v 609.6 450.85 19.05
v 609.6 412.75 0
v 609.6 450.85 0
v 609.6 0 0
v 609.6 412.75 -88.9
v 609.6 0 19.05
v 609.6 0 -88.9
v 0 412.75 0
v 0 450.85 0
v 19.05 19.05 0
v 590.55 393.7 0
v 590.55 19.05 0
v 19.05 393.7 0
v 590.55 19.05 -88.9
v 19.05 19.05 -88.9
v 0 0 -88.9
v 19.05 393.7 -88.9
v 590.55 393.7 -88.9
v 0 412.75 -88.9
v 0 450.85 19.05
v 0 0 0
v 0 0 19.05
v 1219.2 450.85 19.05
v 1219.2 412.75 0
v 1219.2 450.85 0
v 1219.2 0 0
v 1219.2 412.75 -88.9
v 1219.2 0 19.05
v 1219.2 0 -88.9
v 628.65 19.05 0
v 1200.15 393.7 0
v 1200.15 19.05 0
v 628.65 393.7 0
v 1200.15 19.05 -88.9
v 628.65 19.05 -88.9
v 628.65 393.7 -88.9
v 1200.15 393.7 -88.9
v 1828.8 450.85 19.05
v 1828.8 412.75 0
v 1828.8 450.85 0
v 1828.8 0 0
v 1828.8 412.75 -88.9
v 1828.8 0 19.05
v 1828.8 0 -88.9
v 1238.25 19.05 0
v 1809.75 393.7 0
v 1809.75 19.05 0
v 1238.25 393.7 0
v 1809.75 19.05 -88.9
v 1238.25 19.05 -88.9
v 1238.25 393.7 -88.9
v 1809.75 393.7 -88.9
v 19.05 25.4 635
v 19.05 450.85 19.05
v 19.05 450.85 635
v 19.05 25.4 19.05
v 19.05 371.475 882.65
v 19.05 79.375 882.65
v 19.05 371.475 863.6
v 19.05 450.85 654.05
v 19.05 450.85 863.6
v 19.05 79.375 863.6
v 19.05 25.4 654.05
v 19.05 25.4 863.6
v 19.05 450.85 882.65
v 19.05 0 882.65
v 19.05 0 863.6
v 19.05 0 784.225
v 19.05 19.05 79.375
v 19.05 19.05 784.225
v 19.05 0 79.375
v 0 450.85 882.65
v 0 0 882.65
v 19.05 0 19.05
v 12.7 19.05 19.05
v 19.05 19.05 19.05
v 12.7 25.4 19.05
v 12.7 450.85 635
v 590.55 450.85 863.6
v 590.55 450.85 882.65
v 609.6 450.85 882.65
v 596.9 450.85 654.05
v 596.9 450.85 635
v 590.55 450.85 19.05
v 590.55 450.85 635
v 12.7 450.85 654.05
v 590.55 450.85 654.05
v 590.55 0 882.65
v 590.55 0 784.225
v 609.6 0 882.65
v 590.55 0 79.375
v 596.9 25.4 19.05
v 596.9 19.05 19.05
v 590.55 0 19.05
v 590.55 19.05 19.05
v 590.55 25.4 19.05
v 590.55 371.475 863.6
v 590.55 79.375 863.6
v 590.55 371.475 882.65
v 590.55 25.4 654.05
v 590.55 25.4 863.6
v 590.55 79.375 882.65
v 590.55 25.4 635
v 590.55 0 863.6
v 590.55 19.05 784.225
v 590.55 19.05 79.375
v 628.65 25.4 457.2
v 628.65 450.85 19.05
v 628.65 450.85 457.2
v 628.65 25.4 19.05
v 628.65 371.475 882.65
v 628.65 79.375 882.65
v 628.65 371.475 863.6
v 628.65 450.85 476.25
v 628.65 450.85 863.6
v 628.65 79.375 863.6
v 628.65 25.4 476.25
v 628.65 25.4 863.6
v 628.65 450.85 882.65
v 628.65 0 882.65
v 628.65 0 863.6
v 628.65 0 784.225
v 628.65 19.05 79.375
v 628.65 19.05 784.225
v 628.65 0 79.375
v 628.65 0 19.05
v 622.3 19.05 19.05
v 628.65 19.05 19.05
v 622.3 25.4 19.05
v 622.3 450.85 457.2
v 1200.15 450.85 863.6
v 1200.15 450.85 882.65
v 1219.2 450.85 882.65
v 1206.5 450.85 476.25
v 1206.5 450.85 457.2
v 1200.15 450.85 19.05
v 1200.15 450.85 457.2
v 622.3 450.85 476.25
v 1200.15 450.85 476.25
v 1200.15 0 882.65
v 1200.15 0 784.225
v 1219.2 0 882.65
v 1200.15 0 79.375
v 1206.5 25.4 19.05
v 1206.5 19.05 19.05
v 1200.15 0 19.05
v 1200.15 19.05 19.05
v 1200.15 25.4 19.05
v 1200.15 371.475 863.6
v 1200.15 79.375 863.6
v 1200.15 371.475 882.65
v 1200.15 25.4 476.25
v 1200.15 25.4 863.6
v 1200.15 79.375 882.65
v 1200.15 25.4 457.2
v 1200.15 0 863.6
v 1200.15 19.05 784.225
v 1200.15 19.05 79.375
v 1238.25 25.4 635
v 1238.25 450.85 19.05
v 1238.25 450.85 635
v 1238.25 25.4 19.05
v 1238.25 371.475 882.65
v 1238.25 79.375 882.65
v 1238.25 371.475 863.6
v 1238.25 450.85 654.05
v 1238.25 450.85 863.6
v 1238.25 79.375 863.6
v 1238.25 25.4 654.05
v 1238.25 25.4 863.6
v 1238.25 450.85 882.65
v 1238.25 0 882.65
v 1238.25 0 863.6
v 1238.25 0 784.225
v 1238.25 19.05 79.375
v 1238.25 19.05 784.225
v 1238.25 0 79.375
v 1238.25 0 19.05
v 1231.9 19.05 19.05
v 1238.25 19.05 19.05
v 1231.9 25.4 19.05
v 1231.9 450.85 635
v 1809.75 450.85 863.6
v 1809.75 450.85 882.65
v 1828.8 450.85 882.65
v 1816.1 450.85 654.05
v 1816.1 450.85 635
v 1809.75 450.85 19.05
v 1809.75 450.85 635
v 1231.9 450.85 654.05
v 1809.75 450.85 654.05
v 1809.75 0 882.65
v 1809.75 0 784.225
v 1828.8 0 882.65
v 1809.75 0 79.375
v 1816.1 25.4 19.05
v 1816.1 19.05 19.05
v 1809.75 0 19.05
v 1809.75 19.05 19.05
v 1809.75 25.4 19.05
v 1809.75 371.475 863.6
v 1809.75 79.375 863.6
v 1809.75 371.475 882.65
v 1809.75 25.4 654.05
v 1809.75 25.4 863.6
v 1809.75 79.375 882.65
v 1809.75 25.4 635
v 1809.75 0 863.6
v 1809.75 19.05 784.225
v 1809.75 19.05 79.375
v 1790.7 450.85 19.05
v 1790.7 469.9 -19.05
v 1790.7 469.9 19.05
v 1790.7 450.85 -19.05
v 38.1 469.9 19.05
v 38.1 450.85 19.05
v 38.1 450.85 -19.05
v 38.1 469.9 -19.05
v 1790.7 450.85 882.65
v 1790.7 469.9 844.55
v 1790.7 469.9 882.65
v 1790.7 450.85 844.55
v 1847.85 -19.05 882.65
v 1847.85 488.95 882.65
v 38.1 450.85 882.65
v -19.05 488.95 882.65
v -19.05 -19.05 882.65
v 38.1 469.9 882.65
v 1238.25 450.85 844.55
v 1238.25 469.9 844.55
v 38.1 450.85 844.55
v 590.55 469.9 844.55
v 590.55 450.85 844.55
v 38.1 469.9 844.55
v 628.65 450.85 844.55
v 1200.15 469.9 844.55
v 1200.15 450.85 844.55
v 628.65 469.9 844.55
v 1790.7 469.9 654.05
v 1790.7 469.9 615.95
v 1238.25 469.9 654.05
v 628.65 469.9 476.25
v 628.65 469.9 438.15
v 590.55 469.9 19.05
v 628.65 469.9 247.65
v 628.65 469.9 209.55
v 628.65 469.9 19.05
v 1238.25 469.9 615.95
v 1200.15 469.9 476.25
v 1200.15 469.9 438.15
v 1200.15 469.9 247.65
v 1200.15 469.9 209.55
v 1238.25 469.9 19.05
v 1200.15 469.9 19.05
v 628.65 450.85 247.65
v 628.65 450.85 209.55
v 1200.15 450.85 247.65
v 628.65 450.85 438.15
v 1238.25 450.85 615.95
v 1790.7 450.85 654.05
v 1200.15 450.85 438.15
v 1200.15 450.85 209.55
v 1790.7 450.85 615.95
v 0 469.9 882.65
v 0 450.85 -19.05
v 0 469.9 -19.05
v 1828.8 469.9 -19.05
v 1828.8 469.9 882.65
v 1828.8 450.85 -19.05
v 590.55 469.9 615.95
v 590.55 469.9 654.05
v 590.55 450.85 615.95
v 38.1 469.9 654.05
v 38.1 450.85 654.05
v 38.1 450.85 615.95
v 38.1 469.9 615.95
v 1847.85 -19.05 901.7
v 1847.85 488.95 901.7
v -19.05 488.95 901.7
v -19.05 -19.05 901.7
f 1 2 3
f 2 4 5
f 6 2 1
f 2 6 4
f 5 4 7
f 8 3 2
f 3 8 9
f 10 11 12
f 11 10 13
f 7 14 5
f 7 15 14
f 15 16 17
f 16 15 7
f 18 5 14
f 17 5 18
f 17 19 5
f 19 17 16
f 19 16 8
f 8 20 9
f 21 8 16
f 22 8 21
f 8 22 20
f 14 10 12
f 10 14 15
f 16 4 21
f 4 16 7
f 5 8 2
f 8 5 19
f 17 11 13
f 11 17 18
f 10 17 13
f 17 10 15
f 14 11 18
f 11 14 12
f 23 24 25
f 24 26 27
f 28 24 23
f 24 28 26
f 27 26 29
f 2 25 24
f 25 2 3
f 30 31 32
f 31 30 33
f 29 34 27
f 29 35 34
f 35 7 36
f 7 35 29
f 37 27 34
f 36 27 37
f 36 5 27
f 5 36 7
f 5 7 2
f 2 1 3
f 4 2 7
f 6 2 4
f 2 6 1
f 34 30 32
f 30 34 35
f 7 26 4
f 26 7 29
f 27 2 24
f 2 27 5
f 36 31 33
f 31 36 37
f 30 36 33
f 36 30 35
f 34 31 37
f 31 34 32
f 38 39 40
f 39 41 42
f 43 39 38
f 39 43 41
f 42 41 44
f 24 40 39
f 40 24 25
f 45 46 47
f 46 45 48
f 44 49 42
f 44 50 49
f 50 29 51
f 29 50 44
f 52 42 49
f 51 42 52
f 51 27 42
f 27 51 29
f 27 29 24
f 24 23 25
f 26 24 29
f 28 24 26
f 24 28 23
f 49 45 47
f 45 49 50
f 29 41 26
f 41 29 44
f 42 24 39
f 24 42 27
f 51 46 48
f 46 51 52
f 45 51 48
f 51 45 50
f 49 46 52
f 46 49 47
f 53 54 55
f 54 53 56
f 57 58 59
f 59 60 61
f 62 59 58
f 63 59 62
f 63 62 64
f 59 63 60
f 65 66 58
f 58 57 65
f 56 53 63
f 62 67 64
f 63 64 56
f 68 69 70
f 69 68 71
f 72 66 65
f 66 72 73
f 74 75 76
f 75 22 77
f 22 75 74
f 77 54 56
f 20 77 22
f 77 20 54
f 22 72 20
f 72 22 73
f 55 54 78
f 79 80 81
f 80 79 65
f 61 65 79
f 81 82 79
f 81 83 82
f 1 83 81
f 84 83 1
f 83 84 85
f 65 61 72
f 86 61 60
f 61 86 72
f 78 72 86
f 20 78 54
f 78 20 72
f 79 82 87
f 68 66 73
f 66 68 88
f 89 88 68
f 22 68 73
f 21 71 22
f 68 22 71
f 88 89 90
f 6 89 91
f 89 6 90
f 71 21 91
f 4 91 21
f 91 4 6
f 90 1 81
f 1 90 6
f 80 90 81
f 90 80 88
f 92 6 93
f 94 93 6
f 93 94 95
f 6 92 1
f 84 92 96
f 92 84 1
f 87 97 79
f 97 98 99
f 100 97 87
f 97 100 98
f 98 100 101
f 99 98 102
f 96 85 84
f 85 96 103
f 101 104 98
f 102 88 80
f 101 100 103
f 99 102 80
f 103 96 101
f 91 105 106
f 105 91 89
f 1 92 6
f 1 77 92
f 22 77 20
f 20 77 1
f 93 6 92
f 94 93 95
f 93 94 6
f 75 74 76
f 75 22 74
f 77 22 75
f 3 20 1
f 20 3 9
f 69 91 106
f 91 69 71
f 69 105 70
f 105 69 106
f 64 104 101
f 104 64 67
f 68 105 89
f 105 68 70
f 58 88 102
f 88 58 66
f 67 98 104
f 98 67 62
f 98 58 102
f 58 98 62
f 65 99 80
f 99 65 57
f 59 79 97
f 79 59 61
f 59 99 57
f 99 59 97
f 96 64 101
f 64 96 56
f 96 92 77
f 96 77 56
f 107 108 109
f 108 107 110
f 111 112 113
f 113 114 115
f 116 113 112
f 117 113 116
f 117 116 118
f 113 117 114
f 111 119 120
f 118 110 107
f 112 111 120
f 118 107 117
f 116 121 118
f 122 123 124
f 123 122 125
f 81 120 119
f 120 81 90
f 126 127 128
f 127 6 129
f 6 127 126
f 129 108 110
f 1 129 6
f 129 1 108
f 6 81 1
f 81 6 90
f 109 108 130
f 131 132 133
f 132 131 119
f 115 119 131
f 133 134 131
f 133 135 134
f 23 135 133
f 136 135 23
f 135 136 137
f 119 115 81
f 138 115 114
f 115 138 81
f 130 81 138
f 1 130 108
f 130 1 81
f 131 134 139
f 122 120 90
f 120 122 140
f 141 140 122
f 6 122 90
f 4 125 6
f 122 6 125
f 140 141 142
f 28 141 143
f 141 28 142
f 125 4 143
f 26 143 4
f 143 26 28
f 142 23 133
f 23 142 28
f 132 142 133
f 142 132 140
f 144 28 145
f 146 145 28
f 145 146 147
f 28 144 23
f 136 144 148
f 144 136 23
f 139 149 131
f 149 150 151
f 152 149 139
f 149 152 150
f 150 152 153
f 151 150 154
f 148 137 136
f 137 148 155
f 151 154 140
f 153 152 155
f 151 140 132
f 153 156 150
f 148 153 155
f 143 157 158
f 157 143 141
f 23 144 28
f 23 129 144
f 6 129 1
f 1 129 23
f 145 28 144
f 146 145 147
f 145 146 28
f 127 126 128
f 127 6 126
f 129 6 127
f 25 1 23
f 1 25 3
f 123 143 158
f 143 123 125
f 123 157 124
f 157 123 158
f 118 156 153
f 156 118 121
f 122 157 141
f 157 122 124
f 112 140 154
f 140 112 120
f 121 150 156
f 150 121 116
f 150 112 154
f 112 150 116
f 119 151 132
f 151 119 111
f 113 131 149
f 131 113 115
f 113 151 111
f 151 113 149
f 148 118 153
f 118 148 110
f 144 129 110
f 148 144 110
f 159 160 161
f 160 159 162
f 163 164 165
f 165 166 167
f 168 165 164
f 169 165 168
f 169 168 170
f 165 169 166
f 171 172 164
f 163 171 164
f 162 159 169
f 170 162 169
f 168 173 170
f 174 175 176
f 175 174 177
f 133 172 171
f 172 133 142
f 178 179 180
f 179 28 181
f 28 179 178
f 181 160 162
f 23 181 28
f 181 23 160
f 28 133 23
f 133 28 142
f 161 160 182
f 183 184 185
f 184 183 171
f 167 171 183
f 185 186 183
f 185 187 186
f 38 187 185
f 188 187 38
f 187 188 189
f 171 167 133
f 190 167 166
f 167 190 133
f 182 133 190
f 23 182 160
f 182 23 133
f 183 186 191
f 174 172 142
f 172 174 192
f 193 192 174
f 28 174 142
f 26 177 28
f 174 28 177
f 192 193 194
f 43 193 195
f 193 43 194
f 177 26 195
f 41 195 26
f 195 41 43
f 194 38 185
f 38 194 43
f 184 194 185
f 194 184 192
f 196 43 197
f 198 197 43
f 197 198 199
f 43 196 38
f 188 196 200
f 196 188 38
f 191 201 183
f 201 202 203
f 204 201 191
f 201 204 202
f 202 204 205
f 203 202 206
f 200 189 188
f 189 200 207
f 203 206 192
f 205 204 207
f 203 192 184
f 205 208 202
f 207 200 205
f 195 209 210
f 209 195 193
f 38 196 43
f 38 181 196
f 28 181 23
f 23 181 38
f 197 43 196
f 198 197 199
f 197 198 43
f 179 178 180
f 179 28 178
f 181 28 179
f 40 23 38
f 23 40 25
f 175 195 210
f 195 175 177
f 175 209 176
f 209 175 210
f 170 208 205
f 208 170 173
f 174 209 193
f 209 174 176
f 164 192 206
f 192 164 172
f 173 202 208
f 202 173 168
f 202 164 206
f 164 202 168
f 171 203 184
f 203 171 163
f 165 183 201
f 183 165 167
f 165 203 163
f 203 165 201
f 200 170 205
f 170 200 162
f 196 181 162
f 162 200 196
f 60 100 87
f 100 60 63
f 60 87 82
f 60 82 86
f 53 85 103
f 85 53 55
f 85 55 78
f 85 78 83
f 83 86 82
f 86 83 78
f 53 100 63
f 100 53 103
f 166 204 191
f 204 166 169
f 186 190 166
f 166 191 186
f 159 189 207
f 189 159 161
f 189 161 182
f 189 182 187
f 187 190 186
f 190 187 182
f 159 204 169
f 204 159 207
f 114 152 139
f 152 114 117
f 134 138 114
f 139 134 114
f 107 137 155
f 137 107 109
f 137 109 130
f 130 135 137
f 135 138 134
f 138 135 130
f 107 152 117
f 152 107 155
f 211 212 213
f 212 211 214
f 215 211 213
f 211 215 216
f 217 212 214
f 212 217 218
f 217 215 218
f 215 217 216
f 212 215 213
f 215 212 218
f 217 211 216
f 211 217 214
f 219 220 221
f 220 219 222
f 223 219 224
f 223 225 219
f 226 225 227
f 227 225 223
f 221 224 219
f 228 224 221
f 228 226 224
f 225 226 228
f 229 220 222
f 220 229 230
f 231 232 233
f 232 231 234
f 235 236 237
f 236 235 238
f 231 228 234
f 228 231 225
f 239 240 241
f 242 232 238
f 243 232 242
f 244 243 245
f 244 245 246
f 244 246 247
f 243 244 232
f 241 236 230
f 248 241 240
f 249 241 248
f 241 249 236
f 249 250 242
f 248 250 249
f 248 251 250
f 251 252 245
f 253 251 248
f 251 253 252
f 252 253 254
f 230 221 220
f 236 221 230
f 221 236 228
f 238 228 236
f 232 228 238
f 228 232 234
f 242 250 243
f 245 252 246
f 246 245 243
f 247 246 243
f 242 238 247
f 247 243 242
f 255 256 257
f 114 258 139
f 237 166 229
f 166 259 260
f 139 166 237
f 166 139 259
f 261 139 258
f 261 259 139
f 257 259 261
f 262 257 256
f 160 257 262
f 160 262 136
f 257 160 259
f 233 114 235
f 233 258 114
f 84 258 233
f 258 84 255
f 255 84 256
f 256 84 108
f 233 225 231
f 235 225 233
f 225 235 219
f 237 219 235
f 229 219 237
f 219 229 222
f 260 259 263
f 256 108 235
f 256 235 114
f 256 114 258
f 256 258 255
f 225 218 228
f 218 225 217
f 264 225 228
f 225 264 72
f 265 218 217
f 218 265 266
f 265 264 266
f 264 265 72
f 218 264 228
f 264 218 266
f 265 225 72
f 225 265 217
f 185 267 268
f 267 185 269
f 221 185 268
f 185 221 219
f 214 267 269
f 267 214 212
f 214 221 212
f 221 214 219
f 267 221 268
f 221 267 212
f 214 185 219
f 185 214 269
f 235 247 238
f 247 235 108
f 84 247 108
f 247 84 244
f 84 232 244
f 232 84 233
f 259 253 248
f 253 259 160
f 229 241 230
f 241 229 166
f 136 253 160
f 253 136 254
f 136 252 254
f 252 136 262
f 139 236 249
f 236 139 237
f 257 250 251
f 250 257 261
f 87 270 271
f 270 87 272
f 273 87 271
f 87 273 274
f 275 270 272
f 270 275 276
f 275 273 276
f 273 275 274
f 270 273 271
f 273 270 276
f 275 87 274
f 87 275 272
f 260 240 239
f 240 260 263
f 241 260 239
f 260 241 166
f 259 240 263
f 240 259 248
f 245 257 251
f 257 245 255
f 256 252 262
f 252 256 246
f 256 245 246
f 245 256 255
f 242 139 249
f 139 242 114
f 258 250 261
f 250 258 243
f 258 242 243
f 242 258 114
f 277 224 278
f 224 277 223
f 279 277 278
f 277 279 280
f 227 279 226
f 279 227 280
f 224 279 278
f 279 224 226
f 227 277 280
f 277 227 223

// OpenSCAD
include <constructive/constructive-compiled.scad> 

// Function to convert inches to millimeters
function inches_to_mm(inches) = inches * 25.4;

tot_width = inches_to_mm(72);
tot_height = inches_to_mm(39);
tot_depth = inches_to_mm(18.5);

carcas_thickness = inches_to_mm(0.75);
brace_width = inches_to_mm(3.125);

top_thickness = inches_to_mm(0.75);
top_overhang = inches_to_mm(0.75);

face_thickness = inches_to_mm(0.75);
face_width = carcas_thickness * 2;

kick_height = inches_to_mm(3.5);
drawer_height = inches_to_mm(9);


panel_thickness = inches_to_mm(0.25);
dado_depth = inches_to_mm(0.25);

//module drawer_slide(
//    depth=inches_to_mm(15.51),
//    height=inches_to_mm(2.01),
//    width=inches_to_mm(2.01)
//){
//    box(
//        height,
//        x=width,
//        y=depth
//    );
//}


module kick_plate(
    depth=tot_depth,
    height=kick_height,
    width=tot_width,
    thickness=carcas_thickness,
    kick_inset=inches_to_mm(3)
){
    Y(thickness)
    union() {
        // Runners
        TOFRONT()
        TORIGHT()
        pieces(2)
        Y(span(depth - kick_inset))
        box(
            thickness,
            x=width,
            h=height
        );
        
        // Sides
        TOFRONT()
        TORIGHT()
        pieces(2)
        X(span(width - thickness))
        turnXY(90)
        box(
            thickness,
            x=depth - kick_inset - thickness,
            h=height
        );
    }
}

module frame_outline(
    depth=tot_depth,
    height=tot_height - kick_height - top_thickness,
    width=tot_width,
    thickness=carcas_thickness,
    brace_width=brace_width,
    col=yellow
){
    
    clear(col)
    union() {
        stack(TOUP)
        TOREAR()
        TORIGHT()
        // Bottom
        box(
            width,
            y=depth - thickness,
            h=thickness
        )
        // Sides
        pieces(2)
        X(span(width - thickness))
        box(
            thickness,
            y=depth - thickness,
            h=height - thickness
        );
        
        // Back Braces
        TOREAR()
        TORIGHT()
        pieces(2)
        Z(span(
            height - brace_width - thickness
        ))
        X(thickness)
        box(
            thickness,
            x=width-thickness*2,
            h=brace_width
        );

        // Top Braces
        TOREAR()
        TORIGHT()
        Z(height - thickness)
        pieces(2)
        Y(span(
            depth - brace_width - thickness
        ))
        X(thickness)
        box(
            brace_width,
            x=width-thickness*2,
            h=thickness
        );
    }
}

module frame_storage(
    depth=tot_depth,
    height=tot_height - kick_height - top_thickness,
    width=tot_width,
    face_width=face_width,
    face_thickness=face_thickness,
    carcas_thickness=carcas_thickness,
    division_width=tot_width / 3,
    drawer_height=drawer_height,
    dado_depth=dado_depth,
    panel_thickness=panel_thickness
){
    divider_depth = (
        depth - 
        carcas_thickness -
        panel_thickness -
        face_thickness
    );
    
    divider_width = (
        division_width +
        (dado_depth - carcas_thickness)*2
    );
    
    echo(divider_depth);
    
    Y(
        panel_thickness + 
        carcas_thickness
    ) 
    TOREAR()
    TORIGHT()
    union(){
        //
        // SIDE HORIZONTAL DIVIDERS
        //
        
        Z(-(face_width-carcas_thickness)/2)
        Z(
            height - 
            drawer_height
        )
        X(carcas_thickness - dado_depth)
        // Right Horizontal Divider
        box(
            divider_depth,
            x=divider_width,
            h=carcas_thickness
        )
        // Left Horizontal Divider
        X(division_width*2)
        box(
            divider_depth,
            x=divider_width,
            h=carcas_thickness
        );
        
        //
        // CENTER HORIZONTAL DIVIDERS
        //
        
        Z((face_width-carcas_thickness)/2)
        X(division_width + face_width/2 - dado_depth)
        Z(drawer_height*2)
        box(
            divider_depth,
            x=divider_width,
            h=carcas_thickness
        );
    }
}

module back_panel(
    height=tot_height - kick_height - top_thickness,
    width=tot_width,
    carcas_thickness=carcas_thickness,
    panel_thickness=panel_thickness,
    dado_depth=dado_depth,
    col=black
){
    
    // Back Panel
    clear(col)
    Z(carcas_thickness-dado_depth)
    TOREAR()
    TORIGHT()
    X(carcas_thickness - dado_depth)
    Y(carcas_thickness)
    box(
        panel_thickness,
        x=width + (dado_depth - carcas_thickness)*2,
        h=height + dado_depth - carcas_thickness*2
    );

}

module face_plate_outline(
    depth=tot_depth,
    height=tot_height - kick_height - top_thickness,
    width=tot_width,
    face_thickness=face_thickness,
    face_width=face_width,
    carcas_thickness=carcas_thickness,
    division_width=tot_width / 3
){
    Y(depth - carcas_thickness)
    TOREAR()
    TORIGHT()
    union(){
        //
        // FRAME OUTLINE
        //
        
        X(carcas_thickness*2)
        // Bottom
        box(
            face_thickness,
            x=width - carcas_thickness*4,
            h=face_width
        )
        // Top
        Z(height - carcas_thickness)
        box(
            face_thickness,
            x=width - carcas_thickness*4,
            h=face_width
        );
        
        
        Z((height - carcas_thickness)/2)
        // Right
        box(
            face_thickness,
            x=face_width,
            h=height + carcas_thickness
        )
        // Left
        X(width - face_width)
        box(
            face_thickness,
            x=face_width,
            h=height + carcas_thickness
        );
        
        //
        // FRAME VERTICAL DIVIDERS
        //
        
        Z((height - carcas_thickness)/2)
        // Right Vertical Divider
        X(division_width - carcas_thickness)
        box(
            face_thickness,
            x=face_width,
            h=(
                height - 
                face_width - 
                carcas_thickness
            )
        )
        // Left Vertical Divider
        X(division_width)
        box(
            face_thickness,
            x=face_width,
            h=(
                height - 
                face_width - 
                carcas_thickness
            )
        );

    }
}

module face_plate_storage(
    depth=tot_depth,
    height=tot_height - kick_height - top_thickness,
    width=tot_width,
    face_width=face_width,
    face_thickness=face_thickness,
    carcas_thickness=carcas_thickness,
    division_width=tot_width / 3,
    drawer_height=drawer_height
){
    Y(depth - carcas_thickness)
    TOREAR()
    TORIGHT()
    union(){
        //
        // SIDE HORIZONTAL DIVIDERS
        //
        
        Z(
            height - 
            carcas_thickness - 
            drawer_height
        )
        X(face_width)
        // Right Horizontal Divider
        box(
            face_thickness,
            x=(
                division_width - 
                face_width - 
                carcas_thickness
            ),
            h=face_width
        )
        // Left Horizontal Divider
        X(division_width*2 - face_width/2)
        box(
            face_thickness,
            x=(
                division_width - 
                face_width - 
                carcas_thickness
            ),
            h=face_width
        );
        
        //
        // CENTER HORIZONTAL DIVIDERS
        //
        
        X(division_width + face_width/2)
        Z(drawer_height)
        box(
            face_thickness,
            x=(
                division_width - 
                face_width
            ),
            h=face_width
        )
        // Bottom Horizontal Divider
        Z(drawer_height)
        box(
            face_thickness,
            x=(
                division_width - 
                face_width
            ),
            h=face_width
        );
    }
}

module carcas(
    depth=tot_depth,
    height=tot_height,
    width=tot_width,
    kick_height=kick_height,
    top_thickness=top_thickness,
    face_thickness=face_thickness,
    face_width=face_width,
    carcas_thickness=carcas_thickness,
    drawer_height=drawer_height,
    panel_thickness=panel_thickness,
    dado_depth=dado_depth
){
    division_width = width / 3;

    col1 = pink;
    col2 = red;
    col3 = orange;

    TODOWN()
    union() {
        clear(col1)
        kick_plate(
            depth=depth,
            height=kick_height,
            width=division_width
        );
        
        clear(col2)
        X(division_width)
        kick_plate(
            depth=depth,
            height=kick_height,
            width=division_width
        );
        
        clear(col3)
        X(division_width * 2)
        kick_plate(
            depth=depth,
            height=kick_height,
            width=division_width
        );
    }
    TOUP()
    union() {
        union() {
            back_panel(
                height=(
                    height - 
                    kick_height -
                    top_thickness
                ),
                width=division_width,
                carcas_thickness=carcas_thickness,
                col=col1
            );
            frame_outline(
                depth=depth,
                height=(
                    height - 
                    kick_height -
                    top_thickness
                ),
                width=division_width,
                col=col1
            );
        }
        
        X(division_width)
        union() {
            back_panel(
                height=(
                    height - 
                    kick_height -
                    top_thickness
                ),
                width=division_width,
                carcas_thickness=carcas_thickness,
                col=col2
            );
            frame_outline(
                depth=depth,
                height=(
                    height - 
                    kick_height -
                    top_thickness
                ),
                width=division_width,
                col=col2
            );
        }

        X(division_width * 2)
        union() {
            back_panel(
                height=(
                    height - 
                    kick_height -
                    top_thickness
                ),
                width=division_width,
                carcas_thickness=carcas_thickness,
                col=col3
            );
            frame_outline(
                depth=depth,
                height=(
                    height - 
                    kick_height -
                    top_thickness
                ),
                width=division_width,
                col=col3
            );
        }
    }
    clear(black)
    frame_storage(
        depth=depth,
        height=(
            height -
            kick_height -
            top_thickness
        ),
        width=width,
        face_thickness=face_thickness,
        face_width=face_width,
        carcas_thickness=carcas_thickness,
        division_width=division_width,
        dado_depth=dado_depth,
        panel_thickness=panel_thickness
    );
    
    clear()
    face_plate_outline(
        depth=depth,
        height=(
            height -
            kick_height -
            top_thickness
        ),
        width=width,
        face_thickness=face_thickness,
        face_width=face_width,
        carcas_thickness=carcas_thickness,
        division_width=division_width
    );
    clear()
    face_plate_storage(
        depth=depth,
        height=(
            height -
            kick_height -
            top_thickness
        ),
        width=width,
        face_thickness=face_thickness,
        face_width=face_width,
        carcas_thickness=carcas_thickness,
        division_width=division_width
    );
}

module top(
    depth=tot_depth,
    width=tot_width,
    thickness=top_thickness,
    overhang=top_overhang
){
    X(-overhang)
    Y(-overhang)
    TOREAR()
    TORIGHT()
    box(
        depth + overhang*2,
        x=width + overhang*2,
        h=top_thickness
    );
}

carcas(
    depth=tot_depth,
    height=tot_height,
    width=tot_width,
    kick_height=kick_height,
    top_thickness=top_thickness,
    face_width=face_width,
    face_thickness=face_thickness,
    carcas_thickness=carcas_thickness,
    drawer_height=drawer_height,
    panel_thickness=panel_thickness,
    dado_depth=dado_depth
);
clear()
Z(
    tot_height -
    kick_height -
    top_thickness/2
)top(
    depth=tot_depth,
    width=tot_width,
    thickness=top_thickness,
    overhang=top_overhang
);
